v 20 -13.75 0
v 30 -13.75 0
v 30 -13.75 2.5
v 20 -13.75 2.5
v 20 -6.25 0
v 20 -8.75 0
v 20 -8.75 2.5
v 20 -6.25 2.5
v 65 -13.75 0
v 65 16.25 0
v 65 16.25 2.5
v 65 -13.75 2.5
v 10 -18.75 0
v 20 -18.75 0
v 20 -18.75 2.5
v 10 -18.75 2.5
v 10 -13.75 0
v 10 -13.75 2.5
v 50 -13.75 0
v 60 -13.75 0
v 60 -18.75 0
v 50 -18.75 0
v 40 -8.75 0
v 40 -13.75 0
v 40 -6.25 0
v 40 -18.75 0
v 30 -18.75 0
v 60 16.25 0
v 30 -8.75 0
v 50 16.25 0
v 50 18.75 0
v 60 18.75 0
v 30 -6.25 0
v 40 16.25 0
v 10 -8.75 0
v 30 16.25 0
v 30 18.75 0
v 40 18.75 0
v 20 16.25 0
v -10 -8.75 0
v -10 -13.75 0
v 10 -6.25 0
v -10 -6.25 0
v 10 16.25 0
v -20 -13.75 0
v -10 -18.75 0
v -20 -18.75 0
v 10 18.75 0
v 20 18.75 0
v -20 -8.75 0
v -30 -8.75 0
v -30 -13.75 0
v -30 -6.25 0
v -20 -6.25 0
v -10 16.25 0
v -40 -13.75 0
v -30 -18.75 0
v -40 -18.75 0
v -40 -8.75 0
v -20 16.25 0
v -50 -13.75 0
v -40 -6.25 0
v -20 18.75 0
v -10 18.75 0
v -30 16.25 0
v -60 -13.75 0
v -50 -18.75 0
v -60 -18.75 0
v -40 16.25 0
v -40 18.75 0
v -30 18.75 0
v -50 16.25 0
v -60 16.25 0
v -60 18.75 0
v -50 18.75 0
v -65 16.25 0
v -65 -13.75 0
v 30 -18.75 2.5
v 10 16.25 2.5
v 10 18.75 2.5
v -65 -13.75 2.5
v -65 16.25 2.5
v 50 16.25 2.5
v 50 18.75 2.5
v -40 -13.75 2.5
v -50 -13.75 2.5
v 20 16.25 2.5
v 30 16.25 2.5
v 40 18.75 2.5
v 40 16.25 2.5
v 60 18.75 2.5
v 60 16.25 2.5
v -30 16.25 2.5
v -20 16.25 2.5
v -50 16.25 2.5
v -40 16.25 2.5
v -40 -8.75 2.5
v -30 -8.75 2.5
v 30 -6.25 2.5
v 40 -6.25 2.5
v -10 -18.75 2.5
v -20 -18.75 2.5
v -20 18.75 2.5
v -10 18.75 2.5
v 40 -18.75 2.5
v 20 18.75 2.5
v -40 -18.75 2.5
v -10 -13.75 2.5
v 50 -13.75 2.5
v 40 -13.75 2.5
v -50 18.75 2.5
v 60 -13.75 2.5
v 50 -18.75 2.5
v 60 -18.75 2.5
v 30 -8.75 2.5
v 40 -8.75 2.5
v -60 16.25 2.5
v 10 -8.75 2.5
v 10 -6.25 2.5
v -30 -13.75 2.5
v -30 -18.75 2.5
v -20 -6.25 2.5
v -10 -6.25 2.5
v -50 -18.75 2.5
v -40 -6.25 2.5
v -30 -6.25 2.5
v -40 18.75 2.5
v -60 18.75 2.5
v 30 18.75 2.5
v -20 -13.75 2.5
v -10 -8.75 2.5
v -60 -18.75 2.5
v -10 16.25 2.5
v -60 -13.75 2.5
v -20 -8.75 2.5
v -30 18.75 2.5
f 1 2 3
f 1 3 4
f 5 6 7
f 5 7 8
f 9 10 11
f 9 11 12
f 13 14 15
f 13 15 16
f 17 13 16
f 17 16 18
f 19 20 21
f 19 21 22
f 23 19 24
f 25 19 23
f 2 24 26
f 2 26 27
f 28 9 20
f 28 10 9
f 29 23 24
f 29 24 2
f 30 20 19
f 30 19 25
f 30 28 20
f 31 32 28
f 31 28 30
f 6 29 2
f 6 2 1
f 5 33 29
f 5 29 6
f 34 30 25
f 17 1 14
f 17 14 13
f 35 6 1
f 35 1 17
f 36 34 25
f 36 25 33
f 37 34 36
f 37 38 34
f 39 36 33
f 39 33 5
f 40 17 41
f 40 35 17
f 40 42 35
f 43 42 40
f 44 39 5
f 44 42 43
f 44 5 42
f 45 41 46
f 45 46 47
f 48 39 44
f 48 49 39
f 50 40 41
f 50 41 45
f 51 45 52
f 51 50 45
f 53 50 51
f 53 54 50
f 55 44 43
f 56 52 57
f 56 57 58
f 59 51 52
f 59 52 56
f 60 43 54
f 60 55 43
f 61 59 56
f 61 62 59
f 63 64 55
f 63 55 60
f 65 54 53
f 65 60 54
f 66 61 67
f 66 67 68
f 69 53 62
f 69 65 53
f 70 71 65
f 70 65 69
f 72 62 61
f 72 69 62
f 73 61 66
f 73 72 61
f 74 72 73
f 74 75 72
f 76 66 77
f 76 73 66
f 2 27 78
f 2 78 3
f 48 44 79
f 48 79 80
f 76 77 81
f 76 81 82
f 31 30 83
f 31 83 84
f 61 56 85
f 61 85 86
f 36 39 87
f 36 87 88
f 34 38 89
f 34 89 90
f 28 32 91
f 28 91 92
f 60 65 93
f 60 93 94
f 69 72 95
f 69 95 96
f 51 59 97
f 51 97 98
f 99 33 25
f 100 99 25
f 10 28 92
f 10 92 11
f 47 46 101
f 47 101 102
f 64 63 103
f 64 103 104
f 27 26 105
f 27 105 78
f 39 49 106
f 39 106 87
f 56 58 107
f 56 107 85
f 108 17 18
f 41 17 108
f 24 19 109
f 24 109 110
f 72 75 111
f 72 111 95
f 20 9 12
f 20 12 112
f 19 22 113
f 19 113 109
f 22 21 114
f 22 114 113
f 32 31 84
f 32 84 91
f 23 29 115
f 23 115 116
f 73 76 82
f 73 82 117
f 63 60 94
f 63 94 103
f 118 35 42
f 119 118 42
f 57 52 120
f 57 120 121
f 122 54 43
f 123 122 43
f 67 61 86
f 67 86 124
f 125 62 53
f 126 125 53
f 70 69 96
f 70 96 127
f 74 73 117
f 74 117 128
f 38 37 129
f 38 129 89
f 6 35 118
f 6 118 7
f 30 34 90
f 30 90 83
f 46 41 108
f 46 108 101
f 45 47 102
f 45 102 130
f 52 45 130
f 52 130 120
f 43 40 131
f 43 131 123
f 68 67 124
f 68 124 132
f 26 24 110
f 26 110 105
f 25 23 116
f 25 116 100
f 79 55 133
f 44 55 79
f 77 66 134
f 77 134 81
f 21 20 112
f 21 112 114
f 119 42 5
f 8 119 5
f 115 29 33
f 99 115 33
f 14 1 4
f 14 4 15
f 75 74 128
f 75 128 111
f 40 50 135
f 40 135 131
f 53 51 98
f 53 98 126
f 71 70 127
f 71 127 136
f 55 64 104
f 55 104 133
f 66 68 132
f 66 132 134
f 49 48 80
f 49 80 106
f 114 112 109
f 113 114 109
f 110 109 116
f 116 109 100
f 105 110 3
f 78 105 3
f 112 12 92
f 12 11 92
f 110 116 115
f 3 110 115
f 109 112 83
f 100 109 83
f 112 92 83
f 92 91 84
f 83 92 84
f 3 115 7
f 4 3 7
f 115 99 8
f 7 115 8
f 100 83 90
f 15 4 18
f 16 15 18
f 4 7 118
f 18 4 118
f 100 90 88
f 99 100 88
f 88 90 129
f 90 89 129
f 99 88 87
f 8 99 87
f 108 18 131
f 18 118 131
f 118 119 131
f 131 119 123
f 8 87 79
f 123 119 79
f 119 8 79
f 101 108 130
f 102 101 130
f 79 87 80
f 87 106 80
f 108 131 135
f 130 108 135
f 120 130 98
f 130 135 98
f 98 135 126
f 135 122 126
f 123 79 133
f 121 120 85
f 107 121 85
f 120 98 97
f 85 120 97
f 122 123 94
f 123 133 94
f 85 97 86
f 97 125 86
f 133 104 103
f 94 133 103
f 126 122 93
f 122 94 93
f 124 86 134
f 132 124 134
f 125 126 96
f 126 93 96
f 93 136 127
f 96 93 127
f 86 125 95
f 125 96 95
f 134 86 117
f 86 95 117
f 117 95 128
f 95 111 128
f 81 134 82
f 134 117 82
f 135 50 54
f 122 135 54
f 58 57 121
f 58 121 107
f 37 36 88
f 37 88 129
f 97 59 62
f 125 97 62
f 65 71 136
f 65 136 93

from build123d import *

# Parameters (mm, degrees)
SKETCH1_W           = 10
SKETCH1_H           = 2.5
BOSS_EXTRUDE1_DEPTH = 2.5


with BuildPart() as part:
    # Sketch1 → Boss-Extrude1 (new body)
    with BuildSketch(Plane.XY):
        Polygon((65, -13.75), (60, -13.75), (60, -18.75), (50, -18.75), (50, -13.75), (40, -13.75), (40, -18.75), (30, -18.75), (30, -13.75), (20, -13.75), (20, -18.75), (10, -18.75), (10, -13.75), (-10, -13.75), (-10, -18.75), (-20, -18.75), (-20, -13.75), (-30, -13.75), (-30, -18.75), (-40, -18.75), (-40, -13.75), (-50, -13.75), (-50, -18.75), (-60, -18.75), (-60, -13.75), (-65, -13.75), (-65, 16.25), (-60, 16.25), (-60, 18.75), (-50, 18.75), (-50, 16.25), (-40, 16.25), (-40, 18.75), (-30, 18.75), (-30, 16.25), (-20, 16.25), (-20, 18.75), (-10, 18.75), (-10, 16.25), (10, 16.25), (10, 18.75), (20, 18.75), (20, 16.25), (30, 16.25), (30, 18.75), (40, 18.75), (40, 16.25), (50, 16.25), (50, 18.75), (60, 18.75), (60, 16.25), (65, 16.25), align=None)
        with Locations((-15, -7.5)):
            Rectangle(SKETCH1_W, SKETCH1_H, mode=Mode.SUBTRACT)
        with Locations((-35, -7.5)):
            Rectangle(SKETCH1_W, SKETCH1_H, mode=Mode.SUBTRACT)
        with Locations((15, -7.5)):
            Rectangle(SKETCH1_W, SKETCH1_H, mode=Mode.SUBTRACT)
        with Locations((35, -7.5)):
            Rectangle(SKETCH1_W, SKETCH1_H, mode=Mode.SUBTRACT)
    extrude(amount=BOSS_EXTRUDE1_DEPTH)


solid = part.part
